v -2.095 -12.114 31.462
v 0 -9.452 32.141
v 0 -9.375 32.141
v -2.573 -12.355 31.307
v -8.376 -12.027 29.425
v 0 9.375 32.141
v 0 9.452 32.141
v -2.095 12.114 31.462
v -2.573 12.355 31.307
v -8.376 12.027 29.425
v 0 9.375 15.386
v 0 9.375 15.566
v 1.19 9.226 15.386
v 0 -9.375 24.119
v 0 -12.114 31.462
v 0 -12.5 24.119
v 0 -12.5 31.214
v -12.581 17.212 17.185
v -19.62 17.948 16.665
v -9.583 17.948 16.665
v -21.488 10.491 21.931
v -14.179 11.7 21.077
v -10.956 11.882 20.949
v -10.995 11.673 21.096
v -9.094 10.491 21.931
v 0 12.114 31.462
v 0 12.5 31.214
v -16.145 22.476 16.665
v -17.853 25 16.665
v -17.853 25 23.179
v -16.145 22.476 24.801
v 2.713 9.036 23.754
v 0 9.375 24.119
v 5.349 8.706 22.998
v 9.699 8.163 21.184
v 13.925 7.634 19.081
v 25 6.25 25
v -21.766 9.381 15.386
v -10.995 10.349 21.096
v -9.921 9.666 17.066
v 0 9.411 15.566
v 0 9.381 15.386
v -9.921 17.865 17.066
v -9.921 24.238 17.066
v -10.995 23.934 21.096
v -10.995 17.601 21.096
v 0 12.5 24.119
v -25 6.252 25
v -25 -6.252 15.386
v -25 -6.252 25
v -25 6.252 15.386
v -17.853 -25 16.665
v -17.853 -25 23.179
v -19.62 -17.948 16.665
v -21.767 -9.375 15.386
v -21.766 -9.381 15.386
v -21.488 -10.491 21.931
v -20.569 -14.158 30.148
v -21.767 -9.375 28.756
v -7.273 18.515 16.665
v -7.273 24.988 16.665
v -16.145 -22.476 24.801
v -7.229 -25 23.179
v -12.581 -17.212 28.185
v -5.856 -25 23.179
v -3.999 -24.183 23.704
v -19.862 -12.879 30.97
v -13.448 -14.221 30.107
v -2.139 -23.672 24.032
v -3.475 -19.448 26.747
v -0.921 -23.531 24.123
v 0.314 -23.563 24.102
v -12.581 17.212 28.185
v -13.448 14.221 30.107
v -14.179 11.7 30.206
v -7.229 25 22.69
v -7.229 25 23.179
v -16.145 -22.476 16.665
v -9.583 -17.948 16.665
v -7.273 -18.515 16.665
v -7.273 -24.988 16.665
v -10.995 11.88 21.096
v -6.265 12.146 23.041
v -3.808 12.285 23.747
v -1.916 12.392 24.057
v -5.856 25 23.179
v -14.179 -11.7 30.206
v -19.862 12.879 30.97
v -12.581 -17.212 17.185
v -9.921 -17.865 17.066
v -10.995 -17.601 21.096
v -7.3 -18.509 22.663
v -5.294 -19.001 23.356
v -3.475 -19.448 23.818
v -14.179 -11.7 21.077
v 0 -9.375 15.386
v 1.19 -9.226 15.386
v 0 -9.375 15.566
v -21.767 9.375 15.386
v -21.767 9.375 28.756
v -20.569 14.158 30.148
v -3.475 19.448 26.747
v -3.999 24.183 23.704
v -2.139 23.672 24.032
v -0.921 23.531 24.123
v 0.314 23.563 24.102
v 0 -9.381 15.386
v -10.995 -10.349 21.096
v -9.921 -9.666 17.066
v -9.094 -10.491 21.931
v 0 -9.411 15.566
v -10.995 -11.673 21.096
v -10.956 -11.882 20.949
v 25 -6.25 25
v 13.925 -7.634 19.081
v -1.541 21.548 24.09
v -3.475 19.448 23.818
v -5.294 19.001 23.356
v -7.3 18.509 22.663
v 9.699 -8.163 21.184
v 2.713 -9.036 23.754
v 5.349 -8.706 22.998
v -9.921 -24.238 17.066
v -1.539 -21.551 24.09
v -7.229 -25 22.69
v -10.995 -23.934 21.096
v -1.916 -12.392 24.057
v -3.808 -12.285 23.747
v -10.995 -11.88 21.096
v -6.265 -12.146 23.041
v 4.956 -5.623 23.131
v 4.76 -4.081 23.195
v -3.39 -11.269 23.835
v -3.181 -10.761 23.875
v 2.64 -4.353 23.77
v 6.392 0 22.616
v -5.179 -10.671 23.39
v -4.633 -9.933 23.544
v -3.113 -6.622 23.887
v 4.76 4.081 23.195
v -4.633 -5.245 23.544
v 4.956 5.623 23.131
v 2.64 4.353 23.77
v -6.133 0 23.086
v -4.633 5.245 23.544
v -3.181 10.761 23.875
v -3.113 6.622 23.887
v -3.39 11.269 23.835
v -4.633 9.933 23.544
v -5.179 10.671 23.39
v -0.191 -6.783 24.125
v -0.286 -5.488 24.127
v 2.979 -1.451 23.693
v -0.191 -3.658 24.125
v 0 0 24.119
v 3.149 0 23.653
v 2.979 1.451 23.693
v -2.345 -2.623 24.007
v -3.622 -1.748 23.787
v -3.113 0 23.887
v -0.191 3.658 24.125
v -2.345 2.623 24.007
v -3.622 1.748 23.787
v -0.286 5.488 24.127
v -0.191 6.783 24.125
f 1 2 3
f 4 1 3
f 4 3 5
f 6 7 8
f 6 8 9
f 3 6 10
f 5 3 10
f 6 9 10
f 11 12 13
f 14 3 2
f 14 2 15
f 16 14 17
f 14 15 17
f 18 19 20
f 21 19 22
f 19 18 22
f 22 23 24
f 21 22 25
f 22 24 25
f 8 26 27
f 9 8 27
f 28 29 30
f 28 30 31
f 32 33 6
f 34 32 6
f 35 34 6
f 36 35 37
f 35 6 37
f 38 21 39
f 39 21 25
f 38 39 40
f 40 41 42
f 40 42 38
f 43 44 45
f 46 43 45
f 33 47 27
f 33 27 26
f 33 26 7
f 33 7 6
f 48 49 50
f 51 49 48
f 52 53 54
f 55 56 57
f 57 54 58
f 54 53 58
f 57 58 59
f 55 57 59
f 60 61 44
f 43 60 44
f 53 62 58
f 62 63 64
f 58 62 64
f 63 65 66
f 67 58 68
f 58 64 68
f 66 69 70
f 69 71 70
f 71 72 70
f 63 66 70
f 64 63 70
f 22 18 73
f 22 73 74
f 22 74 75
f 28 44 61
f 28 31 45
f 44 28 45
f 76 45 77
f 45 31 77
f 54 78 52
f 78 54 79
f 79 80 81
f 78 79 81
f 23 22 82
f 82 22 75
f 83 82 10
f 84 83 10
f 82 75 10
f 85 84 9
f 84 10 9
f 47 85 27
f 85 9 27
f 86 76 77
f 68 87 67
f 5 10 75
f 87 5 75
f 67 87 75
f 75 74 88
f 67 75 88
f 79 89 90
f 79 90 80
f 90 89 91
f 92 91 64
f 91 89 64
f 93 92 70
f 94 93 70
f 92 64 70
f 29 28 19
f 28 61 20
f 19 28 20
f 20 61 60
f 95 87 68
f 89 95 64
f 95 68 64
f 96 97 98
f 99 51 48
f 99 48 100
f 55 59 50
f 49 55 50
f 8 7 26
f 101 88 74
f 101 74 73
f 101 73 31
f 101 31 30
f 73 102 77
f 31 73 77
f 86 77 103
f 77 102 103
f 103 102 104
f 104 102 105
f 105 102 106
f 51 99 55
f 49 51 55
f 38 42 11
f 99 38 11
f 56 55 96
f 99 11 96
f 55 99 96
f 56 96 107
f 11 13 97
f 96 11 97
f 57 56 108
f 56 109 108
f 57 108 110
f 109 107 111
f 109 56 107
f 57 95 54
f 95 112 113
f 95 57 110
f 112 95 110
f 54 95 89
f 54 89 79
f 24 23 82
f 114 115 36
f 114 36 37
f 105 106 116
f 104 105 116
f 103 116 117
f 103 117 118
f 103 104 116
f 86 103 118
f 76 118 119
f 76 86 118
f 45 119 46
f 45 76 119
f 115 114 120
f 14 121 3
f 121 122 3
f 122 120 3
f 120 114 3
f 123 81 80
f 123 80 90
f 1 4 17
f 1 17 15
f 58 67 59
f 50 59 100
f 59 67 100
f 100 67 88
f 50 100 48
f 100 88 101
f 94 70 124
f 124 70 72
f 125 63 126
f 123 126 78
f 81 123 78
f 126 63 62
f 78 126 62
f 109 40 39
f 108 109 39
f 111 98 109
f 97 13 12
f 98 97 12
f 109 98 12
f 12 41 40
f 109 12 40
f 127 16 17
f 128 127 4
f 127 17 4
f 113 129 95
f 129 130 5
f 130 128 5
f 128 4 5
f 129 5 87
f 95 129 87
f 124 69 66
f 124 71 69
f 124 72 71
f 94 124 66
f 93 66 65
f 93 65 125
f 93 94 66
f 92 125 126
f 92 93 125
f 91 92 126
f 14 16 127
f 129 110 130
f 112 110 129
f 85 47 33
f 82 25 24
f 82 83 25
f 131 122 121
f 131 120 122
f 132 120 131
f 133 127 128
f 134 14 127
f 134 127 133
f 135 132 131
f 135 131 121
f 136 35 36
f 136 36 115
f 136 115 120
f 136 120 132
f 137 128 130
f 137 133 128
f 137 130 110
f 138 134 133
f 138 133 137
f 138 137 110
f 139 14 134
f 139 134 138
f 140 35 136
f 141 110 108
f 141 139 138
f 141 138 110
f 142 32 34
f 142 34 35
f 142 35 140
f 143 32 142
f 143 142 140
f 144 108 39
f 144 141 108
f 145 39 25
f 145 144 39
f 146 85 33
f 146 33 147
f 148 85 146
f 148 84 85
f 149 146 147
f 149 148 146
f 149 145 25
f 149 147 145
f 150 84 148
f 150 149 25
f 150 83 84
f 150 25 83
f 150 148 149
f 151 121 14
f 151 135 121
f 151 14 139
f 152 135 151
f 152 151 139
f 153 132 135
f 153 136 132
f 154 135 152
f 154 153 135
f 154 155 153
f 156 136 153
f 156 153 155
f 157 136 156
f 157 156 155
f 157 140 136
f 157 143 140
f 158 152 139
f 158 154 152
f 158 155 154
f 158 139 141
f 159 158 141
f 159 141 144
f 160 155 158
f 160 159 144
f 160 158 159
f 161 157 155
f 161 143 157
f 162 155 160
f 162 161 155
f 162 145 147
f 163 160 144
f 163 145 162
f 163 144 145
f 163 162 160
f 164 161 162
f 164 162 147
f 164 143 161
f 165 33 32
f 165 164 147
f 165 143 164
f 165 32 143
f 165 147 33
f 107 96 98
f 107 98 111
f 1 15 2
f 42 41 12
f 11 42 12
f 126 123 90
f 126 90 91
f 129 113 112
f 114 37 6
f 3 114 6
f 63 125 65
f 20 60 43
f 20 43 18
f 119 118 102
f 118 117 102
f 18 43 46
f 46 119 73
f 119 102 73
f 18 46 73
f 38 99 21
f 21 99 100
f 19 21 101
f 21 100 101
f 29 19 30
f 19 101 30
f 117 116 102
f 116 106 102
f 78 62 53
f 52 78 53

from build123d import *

# Parameters (mm, degrees)
F0_W     = 50
F0_H     = 50
F1_DEPTH = 50
F5_DEPTH = 50
F6_DEPTH = 50
F7_DEPTH = 50


with BuildPart() as f1:
    # F0 (on Top) → F1 (new body)
    with BuildSketch(Plane.XY):
        Rectangle(F0_W, F0_H)
    extrude(amount=F1_DEPTH)

    # F4 (on face) → F5 (cut)
    with BuildSketch(Plane.XY.offset(50)):
        Polygon((-21.7674206942, -9.375), (-25, -6.2522464432), (-25, -25), (-17.8532954305, -25), align=None)
        Polygon((-17.8532954305, -25), (-7.2292452678, -25), (-16.1449728927, -22.4763174233), align=None)
        Polygon((-25, 25), (-25, 6.2522464432), (-21.7674206942, 9.375), (-17.8532954305, 25), align=None)
        Polygon((-7.2292452678, 25), (-17.8532954305, 25), (-16.1449728927, 22.4763174233), align=None)
        Polygon((0, 9.375), (25, 6.25), (25, 25), (1.6374464612, 25), (-3.4748809412, 19.4482598454), (-12.5812105834, 17.2116179019), (-14.1788134351, 11.6998916492), (0, 12.5), align=None)
        Polygon((25, -6.25), (0, -9.375), (0, -12.5), (-14.1788134351, -11.6998916492), (-12.5812105834, -17.2116179019), (-3.4748809412, -19.4482598454), (1.6374464612, -25), (25, -25), align=None)
    extrude(amount=-F5_DEPTH, mode=Mode.SUBTRACT)

    # F2 (on face) → F6 (cut)
    with BuildSketch(Plane(origin=(0, 25, 0), x_dir=(-1, 0, 0), z_dir=(0, 1, 0))):
        Polygon((-25, 50), (-25, 25), (0, 32.1414284285), (8.3757676184, 29.4250827283), (19.8619887233, 30.9700127691), (25, 25), (25, 50), align=None)
        with BuildLine():
            Line((-13.9249656349, 19.0807655454), (-25, 25))
            Line((-25, 25), (-25, 0))
            Line((-25, 0), (25, 0))
            Line((25, 0), (25, 15.3191965073))
            Line((25, 15.3191965073), (-1.6326936893, 15.3191965073))
            Line((-1.6326936893, 15.3191965073), (9.9206976593, 17.0656405389))
            Line((9.9206976593, 17.0656405389), (10.9954318032, 21.0958924145))
            add(Edge.make_bspline(
                [(-13.9249656349, 19.0807655454), (-9.159473278, 21.5130057184), (-0.2120971707, 26.0796204523), (7.4256507336, 22.683291211), (10.9954318032, 21.0958924145)],
                knots=[0, 0, 0, 0, 0.5326133941, 1, 1, 1, 1], degree=3))
        make_face()
    extrude(amount=-F6_DEPTH, mode=Mode.SUBTRACT)

    # F3 (on face) → F7 (cut)
    with BuildSketch(Plane.YZ.offset(25)):
        Polygon((-25, 50), (-25, 23.1785289943), (-12.1138873269, 31.4618550395), (-6.5010248844, 32.8950696164), (0, 32.8950696164), (6.5010248844, 32.8950696164), (12.1138873269, 31.4618550395), (25, 23.1785289943), (25, 50), align=None)
        Polygon((-17.9481003433, 16.6653934866), (-25, 16.6653934866), (-25, 0), (25, 0), (25, 16.6653934866), (17.9481003433, 16.6653934866), (10.4906205088, 21.9307970256), (9.3806944788, 15.3860524297), (0, 15.3860524297), (-9.3806944788, 15.3860524297), (-10.4906205088, 21.9307970256), align=None)
    extrude(amount=-F7_DEPTH, mode=Mode.SUBTRACT)


solid = f1.part
